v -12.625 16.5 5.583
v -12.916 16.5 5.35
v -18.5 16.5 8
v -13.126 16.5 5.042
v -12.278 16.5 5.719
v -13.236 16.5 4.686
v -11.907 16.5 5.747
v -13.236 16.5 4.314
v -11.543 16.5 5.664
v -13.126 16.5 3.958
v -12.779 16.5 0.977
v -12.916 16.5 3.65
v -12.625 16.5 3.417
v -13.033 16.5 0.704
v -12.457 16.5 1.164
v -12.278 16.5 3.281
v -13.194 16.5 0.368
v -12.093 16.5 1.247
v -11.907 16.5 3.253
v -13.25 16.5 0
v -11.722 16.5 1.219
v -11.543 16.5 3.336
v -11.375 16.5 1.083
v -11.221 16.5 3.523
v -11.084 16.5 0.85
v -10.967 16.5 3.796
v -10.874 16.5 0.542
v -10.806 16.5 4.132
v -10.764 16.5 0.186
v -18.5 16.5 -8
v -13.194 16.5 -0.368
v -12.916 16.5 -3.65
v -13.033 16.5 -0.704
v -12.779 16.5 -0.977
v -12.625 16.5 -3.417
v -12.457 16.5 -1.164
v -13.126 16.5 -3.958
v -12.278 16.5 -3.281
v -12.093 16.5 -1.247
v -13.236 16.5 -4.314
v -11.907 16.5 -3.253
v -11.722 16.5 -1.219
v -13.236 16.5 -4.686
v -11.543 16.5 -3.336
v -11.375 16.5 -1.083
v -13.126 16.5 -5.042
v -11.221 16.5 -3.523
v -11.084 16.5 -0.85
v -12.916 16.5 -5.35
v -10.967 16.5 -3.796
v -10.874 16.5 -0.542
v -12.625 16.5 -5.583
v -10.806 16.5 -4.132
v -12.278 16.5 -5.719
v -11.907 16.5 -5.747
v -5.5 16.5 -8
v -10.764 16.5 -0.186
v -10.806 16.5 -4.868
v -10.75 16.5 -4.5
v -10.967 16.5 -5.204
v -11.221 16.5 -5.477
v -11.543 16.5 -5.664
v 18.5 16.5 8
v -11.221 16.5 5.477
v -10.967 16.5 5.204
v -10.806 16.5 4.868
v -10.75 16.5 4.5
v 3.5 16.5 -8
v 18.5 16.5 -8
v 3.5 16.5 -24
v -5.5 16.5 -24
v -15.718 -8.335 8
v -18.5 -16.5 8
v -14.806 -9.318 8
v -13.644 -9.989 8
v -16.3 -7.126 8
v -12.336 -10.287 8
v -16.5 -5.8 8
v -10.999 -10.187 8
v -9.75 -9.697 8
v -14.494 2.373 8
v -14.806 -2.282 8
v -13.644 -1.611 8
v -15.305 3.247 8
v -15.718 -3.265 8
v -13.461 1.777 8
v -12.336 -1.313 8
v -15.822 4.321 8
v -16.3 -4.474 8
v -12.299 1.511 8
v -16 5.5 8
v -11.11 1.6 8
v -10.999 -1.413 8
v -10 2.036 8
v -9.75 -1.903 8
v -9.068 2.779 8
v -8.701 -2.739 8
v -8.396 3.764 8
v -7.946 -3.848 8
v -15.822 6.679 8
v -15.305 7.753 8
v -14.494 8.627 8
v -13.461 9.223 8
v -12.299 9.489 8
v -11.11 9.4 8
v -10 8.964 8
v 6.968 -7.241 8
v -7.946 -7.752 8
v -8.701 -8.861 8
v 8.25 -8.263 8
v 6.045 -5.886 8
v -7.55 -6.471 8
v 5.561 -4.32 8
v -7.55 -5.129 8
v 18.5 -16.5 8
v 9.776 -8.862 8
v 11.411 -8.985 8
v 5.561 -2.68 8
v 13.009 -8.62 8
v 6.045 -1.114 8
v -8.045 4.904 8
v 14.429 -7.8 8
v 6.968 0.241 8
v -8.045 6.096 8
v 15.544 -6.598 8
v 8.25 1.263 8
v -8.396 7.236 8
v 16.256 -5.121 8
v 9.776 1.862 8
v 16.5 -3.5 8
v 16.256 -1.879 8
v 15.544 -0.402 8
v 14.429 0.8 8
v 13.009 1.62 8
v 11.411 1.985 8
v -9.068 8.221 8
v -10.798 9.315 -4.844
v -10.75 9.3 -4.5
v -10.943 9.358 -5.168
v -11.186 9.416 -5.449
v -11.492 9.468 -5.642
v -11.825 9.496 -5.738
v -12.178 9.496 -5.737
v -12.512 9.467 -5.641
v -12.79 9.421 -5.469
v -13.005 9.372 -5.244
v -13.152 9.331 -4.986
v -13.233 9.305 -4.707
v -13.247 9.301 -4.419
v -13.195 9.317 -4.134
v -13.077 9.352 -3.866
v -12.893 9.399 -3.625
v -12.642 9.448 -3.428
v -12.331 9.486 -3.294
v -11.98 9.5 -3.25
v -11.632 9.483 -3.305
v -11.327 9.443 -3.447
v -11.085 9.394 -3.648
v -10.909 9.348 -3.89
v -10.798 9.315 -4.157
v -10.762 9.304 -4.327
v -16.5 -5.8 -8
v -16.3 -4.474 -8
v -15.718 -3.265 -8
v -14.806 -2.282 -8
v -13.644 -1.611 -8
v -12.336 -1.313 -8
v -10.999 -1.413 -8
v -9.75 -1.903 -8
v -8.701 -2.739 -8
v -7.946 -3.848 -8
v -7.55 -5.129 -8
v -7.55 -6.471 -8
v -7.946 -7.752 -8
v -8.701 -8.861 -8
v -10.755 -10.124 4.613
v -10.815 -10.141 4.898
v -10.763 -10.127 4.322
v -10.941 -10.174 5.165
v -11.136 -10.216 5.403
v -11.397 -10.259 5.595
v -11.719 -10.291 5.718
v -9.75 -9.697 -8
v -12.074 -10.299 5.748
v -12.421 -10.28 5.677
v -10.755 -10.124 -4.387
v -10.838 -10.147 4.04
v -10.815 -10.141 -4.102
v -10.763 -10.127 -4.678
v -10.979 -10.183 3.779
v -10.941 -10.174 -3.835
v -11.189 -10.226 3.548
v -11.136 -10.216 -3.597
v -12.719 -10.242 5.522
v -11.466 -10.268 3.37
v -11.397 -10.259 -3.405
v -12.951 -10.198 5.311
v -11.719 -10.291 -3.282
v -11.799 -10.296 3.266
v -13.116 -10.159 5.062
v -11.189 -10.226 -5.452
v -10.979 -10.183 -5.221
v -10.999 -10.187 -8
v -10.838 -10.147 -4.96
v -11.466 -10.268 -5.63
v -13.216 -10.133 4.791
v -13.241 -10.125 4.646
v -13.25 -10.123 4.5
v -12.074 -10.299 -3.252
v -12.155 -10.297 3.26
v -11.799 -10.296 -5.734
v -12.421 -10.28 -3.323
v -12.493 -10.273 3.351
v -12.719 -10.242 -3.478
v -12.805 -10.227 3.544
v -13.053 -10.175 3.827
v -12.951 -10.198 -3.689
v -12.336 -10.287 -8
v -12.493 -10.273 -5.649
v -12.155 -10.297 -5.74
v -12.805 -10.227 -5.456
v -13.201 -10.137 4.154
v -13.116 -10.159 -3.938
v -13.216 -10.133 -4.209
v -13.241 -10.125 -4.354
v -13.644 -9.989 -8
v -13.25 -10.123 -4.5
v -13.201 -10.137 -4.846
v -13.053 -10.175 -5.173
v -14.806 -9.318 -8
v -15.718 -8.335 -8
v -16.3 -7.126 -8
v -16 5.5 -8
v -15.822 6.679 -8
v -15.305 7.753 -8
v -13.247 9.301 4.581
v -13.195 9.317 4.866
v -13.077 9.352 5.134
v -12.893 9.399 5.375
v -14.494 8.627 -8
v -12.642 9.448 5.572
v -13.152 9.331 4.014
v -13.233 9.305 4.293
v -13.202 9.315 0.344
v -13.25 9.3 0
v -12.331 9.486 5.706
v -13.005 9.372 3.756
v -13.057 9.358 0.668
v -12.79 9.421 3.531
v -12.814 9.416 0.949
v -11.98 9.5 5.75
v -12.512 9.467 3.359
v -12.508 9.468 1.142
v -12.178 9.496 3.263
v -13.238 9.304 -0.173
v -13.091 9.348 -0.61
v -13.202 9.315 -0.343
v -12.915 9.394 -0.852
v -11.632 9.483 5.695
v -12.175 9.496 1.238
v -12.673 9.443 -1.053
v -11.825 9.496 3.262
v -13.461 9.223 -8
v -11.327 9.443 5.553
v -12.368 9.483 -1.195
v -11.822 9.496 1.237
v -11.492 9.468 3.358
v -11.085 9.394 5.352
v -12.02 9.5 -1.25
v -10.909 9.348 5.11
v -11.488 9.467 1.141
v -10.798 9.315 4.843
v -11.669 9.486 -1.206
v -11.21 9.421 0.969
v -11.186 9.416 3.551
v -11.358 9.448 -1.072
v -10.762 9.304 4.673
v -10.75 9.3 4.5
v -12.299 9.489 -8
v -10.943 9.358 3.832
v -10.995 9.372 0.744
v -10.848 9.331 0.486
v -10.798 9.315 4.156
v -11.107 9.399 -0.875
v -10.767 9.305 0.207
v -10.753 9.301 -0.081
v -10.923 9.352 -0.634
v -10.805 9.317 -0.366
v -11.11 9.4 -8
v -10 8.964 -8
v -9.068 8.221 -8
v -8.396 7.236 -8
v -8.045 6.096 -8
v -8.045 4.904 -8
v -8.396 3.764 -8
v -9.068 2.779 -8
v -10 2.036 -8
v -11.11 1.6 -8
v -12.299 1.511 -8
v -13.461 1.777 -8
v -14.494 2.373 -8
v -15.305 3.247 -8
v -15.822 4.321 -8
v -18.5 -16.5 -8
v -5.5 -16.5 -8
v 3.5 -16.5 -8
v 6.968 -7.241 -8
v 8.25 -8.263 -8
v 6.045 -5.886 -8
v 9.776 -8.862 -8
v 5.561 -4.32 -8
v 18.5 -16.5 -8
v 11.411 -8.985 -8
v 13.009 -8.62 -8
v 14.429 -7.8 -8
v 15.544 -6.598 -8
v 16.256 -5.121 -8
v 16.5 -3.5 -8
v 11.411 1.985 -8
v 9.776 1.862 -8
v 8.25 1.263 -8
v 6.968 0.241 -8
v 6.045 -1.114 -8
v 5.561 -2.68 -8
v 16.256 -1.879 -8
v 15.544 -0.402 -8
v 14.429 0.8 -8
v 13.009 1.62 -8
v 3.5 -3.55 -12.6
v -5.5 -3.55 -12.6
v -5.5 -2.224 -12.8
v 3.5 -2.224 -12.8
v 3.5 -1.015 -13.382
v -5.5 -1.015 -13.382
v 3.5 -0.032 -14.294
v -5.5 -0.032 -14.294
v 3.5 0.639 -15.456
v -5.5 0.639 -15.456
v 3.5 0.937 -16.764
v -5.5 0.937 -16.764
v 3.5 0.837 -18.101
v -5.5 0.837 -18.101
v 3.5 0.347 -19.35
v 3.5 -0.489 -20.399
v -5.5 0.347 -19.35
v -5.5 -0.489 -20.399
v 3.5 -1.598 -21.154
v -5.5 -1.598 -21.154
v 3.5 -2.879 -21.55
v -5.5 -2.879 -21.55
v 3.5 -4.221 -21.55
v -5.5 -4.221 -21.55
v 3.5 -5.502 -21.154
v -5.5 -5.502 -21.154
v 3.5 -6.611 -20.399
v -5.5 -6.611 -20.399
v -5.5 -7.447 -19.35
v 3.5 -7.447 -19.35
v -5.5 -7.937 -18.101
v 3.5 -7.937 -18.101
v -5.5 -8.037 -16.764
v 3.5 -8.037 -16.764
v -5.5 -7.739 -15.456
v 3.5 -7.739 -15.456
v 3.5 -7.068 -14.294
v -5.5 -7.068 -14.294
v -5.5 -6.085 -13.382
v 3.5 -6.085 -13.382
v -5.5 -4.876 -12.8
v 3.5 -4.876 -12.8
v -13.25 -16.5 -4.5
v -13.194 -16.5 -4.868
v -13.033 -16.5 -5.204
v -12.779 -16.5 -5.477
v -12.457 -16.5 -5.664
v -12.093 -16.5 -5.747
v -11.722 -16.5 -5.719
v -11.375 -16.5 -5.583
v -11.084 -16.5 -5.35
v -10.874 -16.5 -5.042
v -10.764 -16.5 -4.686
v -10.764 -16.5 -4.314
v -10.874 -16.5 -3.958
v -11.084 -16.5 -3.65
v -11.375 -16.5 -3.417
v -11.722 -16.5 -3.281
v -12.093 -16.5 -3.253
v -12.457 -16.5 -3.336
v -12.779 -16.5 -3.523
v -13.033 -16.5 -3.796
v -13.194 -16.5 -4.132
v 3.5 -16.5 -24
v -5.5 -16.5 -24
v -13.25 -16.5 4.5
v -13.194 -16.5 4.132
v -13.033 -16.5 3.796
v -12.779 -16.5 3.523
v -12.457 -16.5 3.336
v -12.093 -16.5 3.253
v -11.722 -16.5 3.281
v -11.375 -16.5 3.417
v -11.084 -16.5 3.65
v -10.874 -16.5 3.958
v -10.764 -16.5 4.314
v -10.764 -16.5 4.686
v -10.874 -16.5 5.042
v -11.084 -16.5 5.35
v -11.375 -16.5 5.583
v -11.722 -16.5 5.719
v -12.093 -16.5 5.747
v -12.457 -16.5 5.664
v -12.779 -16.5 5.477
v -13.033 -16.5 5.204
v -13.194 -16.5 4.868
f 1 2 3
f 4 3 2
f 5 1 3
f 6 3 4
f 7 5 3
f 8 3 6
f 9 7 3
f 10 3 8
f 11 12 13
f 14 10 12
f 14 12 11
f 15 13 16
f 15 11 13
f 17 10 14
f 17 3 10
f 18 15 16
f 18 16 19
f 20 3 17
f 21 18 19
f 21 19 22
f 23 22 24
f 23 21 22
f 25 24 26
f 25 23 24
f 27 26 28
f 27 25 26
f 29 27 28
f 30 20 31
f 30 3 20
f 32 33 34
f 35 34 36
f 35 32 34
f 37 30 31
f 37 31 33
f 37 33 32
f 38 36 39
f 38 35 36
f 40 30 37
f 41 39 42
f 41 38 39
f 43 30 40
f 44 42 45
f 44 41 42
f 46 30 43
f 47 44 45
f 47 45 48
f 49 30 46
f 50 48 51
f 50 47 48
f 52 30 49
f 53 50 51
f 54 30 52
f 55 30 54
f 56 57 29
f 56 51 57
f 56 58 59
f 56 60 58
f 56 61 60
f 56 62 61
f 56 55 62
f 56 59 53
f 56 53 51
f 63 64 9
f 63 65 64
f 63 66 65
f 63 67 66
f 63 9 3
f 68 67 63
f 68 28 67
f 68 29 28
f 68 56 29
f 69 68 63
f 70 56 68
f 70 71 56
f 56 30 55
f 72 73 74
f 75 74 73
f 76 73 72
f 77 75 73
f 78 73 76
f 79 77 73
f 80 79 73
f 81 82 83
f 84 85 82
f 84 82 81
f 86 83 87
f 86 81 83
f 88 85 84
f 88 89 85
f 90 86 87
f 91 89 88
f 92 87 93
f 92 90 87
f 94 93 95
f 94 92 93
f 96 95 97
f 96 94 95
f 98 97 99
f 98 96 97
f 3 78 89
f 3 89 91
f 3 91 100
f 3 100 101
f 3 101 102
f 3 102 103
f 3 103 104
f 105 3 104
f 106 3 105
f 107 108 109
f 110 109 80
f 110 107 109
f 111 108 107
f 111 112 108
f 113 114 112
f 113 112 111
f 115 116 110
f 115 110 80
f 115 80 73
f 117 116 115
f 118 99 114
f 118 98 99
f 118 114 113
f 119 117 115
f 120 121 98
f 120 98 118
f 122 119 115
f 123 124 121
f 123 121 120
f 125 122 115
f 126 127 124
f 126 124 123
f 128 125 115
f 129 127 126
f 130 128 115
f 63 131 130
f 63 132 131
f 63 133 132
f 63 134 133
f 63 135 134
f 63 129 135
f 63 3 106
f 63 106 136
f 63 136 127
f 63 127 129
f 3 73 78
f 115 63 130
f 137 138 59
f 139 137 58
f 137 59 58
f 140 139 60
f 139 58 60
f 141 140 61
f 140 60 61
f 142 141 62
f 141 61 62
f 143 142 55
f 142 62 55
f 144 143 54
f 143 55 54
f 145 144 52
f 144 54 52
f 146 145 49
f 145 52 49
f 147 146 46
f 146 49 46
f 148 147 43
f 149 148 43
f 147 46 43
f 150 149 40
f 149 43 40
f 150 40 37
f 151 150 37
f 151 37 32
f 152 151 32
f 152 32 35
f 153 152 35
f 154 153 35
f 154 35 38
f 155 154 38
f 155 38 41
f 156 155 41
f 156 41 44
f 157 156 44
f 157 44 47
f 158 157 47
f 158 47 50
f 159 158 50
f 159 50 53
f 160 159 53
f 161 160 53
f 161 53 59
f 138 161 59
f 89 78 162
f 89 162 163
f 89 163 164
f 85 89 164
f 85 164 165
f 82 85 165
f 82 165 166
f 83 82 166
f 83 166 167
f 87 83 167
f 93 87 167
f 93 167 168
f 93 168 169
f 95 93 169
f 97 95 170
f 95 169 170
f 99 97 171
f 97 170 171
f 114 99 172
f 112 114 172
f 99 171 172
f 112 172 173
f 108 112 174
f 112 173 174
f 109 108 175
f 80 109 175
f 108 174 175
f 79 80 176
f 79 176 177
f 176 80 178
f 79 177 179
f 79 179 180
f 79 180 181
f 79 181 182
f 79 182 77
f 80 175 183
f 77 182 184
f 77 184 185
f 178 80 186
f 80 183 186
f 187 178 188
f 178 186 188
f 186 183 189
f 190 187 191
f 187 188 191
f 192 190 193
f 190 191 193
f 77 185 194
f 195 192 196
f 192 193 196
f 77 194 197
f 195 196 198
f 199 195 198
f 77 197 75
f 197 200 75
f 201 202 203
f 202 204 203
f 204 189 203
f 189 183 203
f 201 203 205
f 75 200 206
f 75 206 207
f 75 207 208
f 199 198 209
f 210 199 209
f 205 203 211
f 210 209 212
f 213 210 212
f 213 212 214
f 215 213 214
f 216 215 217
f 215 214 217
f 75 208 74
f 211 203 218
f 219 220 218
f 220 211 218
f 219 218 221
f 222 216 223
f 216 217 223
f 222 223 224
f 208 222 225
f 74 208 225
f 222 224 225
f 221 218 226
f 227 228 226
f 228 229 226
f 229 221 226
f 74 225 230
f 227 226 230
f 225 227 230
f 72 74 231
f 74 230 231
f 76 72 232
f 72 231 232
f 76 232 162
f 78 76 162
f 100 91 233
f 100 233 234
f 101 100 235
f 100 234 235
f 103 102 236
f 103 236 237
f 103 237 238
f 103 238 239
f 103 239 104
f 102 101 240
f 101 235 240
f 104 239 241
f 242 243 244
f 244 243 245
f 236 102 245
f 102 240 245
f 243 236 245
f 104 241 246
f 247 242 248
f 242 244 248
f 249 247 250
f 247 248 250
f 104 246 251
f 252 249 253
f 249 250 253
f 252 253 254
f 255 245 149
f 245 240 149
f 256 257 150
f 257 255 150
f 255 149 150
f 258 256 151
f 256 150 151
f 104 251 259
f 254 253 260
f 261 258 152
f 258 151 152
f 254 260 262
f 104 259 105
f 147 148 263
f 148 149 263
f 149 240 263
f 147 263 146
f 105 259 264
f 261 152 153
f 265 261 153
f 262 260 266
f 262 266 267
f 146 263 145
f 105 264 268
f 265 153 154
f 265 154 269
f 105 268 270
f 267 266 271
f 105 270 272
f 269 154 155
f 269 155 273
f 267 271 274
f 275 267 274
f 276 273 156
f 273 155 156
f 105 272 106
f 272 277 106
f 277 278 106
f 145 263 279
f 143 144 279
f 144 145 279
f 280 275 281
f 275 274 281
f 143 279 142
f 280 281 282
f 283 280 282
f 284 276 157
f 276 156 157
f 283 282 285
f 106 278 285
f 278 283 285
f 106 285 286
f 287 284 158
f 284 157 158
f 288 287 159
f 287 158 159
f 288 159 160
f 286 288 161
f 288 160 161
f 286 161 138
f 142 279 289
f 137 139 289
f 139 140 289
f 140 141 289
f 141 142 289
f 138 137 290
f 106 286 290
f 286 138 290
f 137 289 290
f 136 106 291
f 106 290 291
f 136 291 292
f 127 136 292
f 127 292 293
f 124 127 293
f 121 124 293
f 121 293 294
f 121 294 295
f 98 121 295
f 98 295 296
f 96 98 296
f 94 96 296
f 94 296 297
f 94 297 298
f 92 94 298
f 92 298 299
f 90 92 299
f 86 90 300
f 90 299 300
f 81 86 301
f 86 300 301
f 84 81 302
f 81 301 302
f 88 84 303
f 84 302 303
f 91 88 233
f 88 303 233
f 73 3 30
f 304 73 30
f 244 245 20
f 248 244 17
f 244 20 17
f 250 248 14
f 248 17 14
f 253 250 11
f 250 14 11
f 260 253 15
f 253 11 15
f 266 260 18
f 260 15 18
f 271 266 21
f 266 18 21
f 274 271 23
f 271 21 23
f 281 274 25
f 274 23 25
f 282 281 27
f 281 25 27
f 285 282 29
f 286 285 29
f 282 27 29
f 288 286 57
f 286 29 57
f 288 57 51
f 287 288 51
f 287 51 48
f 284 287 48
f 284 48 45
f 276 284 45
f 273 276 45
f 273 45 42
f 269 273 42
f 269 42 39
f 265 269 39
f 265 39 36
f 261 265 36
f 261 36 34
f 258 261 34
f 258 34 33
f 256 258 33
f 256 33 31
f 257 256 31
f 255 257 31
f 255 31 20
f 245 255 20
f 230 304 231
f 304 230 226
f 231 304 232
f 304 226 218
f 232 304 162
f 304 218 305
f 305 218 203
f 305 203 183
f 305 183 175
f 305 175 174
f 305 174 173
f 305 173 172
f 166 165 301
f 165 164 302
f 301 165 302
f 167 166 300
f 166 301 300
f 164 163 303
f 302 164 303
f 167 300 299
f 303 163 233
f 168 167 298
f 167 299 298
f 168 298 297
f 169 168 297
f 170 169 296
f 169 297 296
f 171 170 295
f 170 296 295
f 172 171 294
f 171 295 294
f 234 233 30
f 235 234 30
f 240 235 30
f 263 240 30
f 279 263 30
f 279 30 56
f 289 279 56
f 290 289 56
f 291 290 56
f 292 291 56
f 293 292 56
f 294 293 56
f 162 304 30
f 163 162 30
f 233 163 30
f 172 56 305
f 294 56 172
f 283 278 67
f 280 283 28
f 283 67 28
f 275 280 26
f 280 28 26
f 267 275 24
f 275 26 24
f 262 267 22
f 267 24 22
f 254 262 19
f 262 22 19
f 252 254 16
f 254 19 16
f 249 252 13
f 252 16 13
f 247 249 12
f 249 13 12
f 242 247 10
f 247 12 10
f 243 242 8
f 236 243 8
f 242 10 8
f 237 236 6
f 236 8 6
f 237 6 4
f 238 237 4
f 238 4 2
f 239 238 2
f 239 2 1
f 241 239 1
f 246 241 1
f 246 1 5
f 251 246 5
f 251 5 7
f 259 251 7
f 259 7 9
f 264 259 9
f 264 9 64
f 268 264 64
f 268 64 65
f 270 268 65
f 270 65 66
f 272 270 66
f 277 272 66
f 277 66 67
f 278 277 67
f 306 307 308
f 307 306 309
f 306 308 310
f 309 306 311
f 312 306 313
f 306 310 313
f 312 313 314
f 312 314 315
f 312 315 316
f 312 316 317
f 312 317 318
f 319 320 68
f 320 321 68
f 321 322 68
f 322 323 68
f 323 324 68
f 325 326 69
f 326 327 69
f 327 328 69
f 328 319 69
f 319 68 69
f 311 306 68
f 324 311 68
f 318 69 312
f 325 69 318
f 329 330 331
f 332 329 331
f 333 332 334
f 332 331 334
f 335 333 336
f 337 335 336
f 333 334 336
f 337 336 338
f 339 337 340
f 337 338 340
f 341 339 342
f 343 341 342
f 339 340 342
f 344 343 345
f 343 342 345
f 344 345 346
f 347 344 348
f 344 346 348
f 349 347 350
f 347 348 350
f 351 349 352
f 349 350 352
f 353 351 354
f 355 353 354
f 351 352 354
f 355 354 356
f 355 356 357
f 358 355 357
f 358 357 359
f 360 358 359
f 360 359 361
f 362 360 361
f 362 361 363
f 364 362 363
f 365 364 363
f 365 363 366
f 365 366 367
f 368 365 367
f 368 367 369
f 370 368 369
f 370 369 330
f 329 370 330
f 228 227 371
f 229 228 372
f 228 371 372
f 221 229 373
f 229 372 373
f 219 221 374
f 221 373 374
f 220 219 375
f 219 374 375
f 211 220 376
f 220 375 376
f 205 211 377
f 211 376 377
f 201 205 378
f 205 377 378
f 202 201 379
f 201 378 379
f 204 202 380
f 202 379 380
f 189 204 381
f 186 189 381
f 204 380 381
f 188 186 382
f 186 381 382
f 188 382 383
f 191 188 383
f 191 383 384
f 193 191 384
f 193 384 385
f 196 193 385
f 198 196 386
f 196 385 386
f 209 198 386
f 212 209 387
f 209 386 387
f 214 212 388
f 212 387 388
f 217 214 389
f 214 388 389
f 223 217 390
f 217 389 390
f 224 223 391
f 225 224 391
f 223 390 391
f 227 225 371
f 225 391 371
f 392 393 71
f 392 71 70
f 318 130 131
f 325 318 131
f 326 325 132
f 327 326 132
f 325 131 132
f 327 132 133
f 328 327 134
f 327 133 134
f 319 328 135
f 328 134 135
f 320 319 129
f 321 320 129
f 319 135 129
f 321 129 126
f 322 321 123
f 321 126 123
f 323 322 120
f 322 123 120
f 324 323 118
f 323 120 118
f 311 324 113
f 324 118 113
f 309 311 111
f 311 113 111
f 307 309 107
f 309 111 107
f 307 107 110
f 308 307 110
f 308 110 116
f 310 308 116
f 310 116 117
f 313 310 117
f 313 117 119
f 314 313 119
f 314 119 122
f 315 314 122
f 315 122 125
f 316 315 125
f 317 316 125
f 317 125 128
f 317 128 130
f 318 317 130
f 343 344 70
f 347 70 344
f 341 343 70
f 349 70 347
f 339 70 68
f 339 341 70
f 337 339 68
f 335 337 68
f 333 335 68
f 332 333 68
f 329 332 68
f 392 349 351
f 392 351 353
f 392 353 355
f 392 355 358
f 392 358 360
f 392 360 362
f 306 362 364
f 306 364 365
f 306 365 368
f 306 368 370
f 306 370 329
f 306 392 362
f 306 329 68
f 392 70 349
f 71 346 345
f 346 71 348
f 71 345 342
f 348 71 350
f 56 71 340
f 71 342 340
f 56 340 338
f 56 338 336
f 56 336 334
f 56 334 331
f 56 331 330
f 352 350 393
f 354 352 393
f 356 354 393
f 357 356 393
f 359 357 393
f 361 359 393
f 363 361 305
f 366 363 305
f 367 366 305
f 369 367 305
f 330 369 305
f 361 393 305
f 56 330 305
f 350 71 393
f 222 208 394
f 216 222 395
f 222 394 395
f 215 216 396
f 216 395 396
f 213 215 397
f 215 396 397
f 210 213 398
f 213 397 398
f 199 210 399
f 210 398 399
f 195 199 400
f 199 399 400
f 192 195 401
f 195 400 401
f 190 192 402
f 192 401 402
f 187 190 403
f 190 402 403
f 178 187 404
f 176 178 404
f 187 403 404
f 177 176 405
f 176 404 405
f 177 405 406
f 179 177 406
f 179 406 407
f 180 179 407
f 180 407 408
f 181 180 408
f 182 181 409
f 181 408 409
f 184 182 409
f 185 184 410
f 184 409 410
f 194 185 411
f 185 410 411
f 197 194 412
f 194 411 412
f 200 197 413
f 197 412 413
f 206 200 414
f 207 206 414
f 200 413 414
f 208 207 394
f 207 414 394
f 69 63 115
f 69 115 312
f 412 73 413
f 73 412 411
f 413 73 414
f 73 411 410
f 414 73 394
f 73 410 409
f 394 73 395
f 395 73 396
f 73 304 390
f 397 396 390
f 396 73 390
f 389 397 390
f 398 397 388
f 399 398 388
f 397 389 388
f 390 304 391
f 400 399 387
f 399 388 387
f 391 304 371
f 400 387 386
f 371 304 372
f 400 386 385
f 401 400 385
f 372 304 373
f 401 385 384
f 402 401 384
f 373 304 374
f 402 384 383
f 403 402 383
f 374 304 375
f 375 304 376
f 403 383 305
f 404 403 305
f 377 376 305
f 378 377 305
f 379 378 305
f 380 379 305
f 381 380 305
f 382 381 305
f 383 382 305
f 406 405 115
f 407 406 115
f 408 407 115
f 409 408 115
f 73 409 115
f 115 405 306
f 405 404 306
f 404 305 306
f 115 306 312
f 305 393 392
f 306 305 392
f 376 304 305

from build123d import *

# Parameters (mm, degrees)
ESQUISSE1_W             = 37
ESQUISSE1_H             = 16
BOSS_EXTRU_1_DEPTH      = 16.5
ESQUISSE3_R             = 5.5
ENL_V_MAT_EXTRU_2_DEPTH = 30.504236984
ESQUISSE14_R            = 4.5
ENL_V_MAT_EXTRU_3_DEPTH = 30.504236984
ESQUISSE15_R            = 4
ENL_V_MAT_EXTRU_4_DEPTH = 30.504236984
TROU_TARAUD_M34_REACH   = 40.668
TROU_TARAUD_M34_BORE_R  = 1.25
TROU_TARAUD_M35_REACH   = 40.668
TROU_TARAUD_M35_BORE_R  = 1.25
TROU_TARAUD_M36_REACH   = 41.444
TROU_TARAUD_M36_BORE_R  = 1.25
ESQUISSE18_W            = 9
ESQUISSE18_H            = 16
BOSS_EXTRU_2_DEPTH      = 33
ESQUISSE20_R            = 4.5
ENL_V_MAT_EXTRU_5_DEPTH = 38.73923692


with BuildPart() as part:
    # Esquisse1 → Boss.-Extru.1 (new, symmetric)
    with BuildSketch(Plane(origin=(0, 0, 0), x_dir=(1, 0, 0), z_dir=(0, 1, 0))):
        Rectangle(ESQUISSE1_W, ESQUISSE1_H)
    extrude(amount=BOSS_EXTRU_1_DEPTH, both=True)

    # Esquisse3 → Enlèv. mat.-Extru.2 (cut, through all)
    with BuildSketch(Plane.XY.offset(8)):
        with Locations((11, -3.5)):
            Circle(ESQUISSE3_R)
    extrude(amount=-ENL_V_MAT_EXTRU_2_DEPTH, mode=Mode.SUBTRACT)

    # Esquisse14 → Enlèv. mat.-Extru.3 (cut, through all)
    with BuildSketch(Plane(origin=(0, 0, -8), x_dir=(-1, 0, 0), z_dir=(0, 0, -1))):
        with Locations((12, -5.8)):
            Circle(ESQUISSE14_R)
    extrude(amount=-ENL_V_MAT_EXTRU_3_DEPTH, mode=Mode.SUBTRACT)

    # Esquisse15 → Enlèv. mat.-Extru.4 (cut, through all)
    with BuildSketch(Plane(origin=(0, 0, -8), x_dir=(-1, 0, 0), z_dir=(0, 0, -1))):
        with Locations((12, 5.5)):
            Circle(ESQUISSE15_R)
    extrude(amount=-ENL_V_MAT_EXTRU_4_DEPTH, mode=Mode.SUBTRACT)

    # Trou taraudé M34 bore → Trou taraudé M34 (cut, up to next)
    with BuildSketch(Plane(origin=(0, 16.5, 0), x_dir=(1, 0, 0), z_dir=(0, 1, 0)), mode=Mode.PRIVATE) as trou_taraud_m34_sk1:
        with Locations((-12, -4.5)):
            Circle(TROU_TARAUD_M34_BORE_R)
    trou_taraud_m34_tool1 = extrude(trou_taraud_m34_sk1.sketch, amount=-TROU_TARAUD_M34_REACH, mode=Mode.PRIVATE) & part.part
    # Trou taraudé M34 bore → Trou taraudé M34 (cut, up to next)
    with BuildSketch(Plane(origin=(0, 16.5, 0), x_dir=(1, 0, 0), z_dir=(0, 1, 0)), mode=Mode.PRIVATE) as trou_taraud_m34_sk2:
        with Locations((-12, 4.5)):
            Circle(TROU_TARAUD_M34_BORE_R)
    trou_taraud_m34_tool2 = extrude(trou_taraud_m34_sk2.sketch, amount=-TROU_TARAUD_M34_REACH, mode=Mode.PRIVATE) & part.part
    add(trou_taraud_m34_tool1.solids().sort_by_distance((-12, 16.5, 4.5))[0], mode=Mode.SUBTRACT)
    add(trou_taraud_m34_tool2.solids().sort_by_distance((-12, 16.5, -4.5))[0], mode=Mode.SUBTRACT)

    # Trou taraudé M35 bore → Trou taraudé M35 (cut, up to next)
    with BuildSketch(Plane(origin=(0, -16.5, 0), x_dir=(-1, 0, 0), z_dir=(0, -1, 0)), mode=Mode.PRIVATE) as trou_taraud_m35_sk1:
        with Locations((12, -4.5)):
            Circle(TROU_TARAUD_M35_BORE_R)
    trou_taraud_m35_tool1 = extrude(trou_taraud_m35_sk1.sketch, amount=-TROU_TARAUD_M35_REACH, mode=Mode.PRIVATE) & part.part
    # Trou taraudé M35 bore → Trou taraudé M35 (cut, up to next)
    with BuildSketch(Plane(origin=(0, -16.5, 0), x_dir=(-1, 0, 0), z_dir=(0, -1, 0)), mode=Mode.PRIVATE) as trou_taraud_m35_sk2:
        with Locations((12, 4.5)):
            Circle(TROU_TARAUD_M35_BORE_R)
    trou_taraud_m35_tool2 = extrude(trou_taraud_m35_sk2.sketch, amount=-TROU_TARAUD_M35_REACH, mode=Mode.PRIVATE) & part.part
    add(trou_taraud_m35_tool1.solids().sort_by_distance((-12, -16.5, 4.5))[0], mode=Mode.SUBTRACT)
    add(trou_taraud_m35_tool2.solids().sort_by_distance((-12, -16.5, -4.5))[0], mode=Mode.SUBTRACT)

    # Trou taraudé M36 bore → Trou taraudé M36 (cut, up to next)
    with BuildSketch(Plane(origin=(-1.446004376, 16.5, -0.30351444), x_dir=(-1, 0, 0), z_dir=(0, 1, 0)), mode=Mode.PRIVATE) as trou_taraud_m36_sk1:
        with Locations((10.553995624, 0.30351444)):
            Circle(TROU_TARAUD_M36_BORE_R)
    trou_taraud_m36_tool1 = extrude(trou_taraud_m36_sk1.sketch, amount=-TROU_TARAUD_M36_REACH, mode=Mode.PRIVATE) & part.part
    add(trou_taraud_m36_tool1.solids().sort_by_distance((-12, 16.5, 0))[0], mode=Mode.SUBTRACT)

    # Esquisse18 → Boss.-Extru.2 (add)
    with BuildSketch(Plane.XZ.offset(16.5)):
        with Locations((-1, -16)):
            Rectangle(ESQUISSE18_W, ESQUISSE18_H)
    extrude(amount=-BOSS_EXTRU_2_DEPTH)

    # Esquisse20 → Enlèv. mat.-Extru.5 (cut, through all)
    with BuildSketch(Plane.ZY.offset(5.5)):
        with Locations((-17.1, -3.55)):
            Circle(ESQUISSE20_R)
    extrude(amount=-ENL_V_MAT_EXTRU_5_DEPTH, mode=Mode.SUBTRACT)


solid = part.part
